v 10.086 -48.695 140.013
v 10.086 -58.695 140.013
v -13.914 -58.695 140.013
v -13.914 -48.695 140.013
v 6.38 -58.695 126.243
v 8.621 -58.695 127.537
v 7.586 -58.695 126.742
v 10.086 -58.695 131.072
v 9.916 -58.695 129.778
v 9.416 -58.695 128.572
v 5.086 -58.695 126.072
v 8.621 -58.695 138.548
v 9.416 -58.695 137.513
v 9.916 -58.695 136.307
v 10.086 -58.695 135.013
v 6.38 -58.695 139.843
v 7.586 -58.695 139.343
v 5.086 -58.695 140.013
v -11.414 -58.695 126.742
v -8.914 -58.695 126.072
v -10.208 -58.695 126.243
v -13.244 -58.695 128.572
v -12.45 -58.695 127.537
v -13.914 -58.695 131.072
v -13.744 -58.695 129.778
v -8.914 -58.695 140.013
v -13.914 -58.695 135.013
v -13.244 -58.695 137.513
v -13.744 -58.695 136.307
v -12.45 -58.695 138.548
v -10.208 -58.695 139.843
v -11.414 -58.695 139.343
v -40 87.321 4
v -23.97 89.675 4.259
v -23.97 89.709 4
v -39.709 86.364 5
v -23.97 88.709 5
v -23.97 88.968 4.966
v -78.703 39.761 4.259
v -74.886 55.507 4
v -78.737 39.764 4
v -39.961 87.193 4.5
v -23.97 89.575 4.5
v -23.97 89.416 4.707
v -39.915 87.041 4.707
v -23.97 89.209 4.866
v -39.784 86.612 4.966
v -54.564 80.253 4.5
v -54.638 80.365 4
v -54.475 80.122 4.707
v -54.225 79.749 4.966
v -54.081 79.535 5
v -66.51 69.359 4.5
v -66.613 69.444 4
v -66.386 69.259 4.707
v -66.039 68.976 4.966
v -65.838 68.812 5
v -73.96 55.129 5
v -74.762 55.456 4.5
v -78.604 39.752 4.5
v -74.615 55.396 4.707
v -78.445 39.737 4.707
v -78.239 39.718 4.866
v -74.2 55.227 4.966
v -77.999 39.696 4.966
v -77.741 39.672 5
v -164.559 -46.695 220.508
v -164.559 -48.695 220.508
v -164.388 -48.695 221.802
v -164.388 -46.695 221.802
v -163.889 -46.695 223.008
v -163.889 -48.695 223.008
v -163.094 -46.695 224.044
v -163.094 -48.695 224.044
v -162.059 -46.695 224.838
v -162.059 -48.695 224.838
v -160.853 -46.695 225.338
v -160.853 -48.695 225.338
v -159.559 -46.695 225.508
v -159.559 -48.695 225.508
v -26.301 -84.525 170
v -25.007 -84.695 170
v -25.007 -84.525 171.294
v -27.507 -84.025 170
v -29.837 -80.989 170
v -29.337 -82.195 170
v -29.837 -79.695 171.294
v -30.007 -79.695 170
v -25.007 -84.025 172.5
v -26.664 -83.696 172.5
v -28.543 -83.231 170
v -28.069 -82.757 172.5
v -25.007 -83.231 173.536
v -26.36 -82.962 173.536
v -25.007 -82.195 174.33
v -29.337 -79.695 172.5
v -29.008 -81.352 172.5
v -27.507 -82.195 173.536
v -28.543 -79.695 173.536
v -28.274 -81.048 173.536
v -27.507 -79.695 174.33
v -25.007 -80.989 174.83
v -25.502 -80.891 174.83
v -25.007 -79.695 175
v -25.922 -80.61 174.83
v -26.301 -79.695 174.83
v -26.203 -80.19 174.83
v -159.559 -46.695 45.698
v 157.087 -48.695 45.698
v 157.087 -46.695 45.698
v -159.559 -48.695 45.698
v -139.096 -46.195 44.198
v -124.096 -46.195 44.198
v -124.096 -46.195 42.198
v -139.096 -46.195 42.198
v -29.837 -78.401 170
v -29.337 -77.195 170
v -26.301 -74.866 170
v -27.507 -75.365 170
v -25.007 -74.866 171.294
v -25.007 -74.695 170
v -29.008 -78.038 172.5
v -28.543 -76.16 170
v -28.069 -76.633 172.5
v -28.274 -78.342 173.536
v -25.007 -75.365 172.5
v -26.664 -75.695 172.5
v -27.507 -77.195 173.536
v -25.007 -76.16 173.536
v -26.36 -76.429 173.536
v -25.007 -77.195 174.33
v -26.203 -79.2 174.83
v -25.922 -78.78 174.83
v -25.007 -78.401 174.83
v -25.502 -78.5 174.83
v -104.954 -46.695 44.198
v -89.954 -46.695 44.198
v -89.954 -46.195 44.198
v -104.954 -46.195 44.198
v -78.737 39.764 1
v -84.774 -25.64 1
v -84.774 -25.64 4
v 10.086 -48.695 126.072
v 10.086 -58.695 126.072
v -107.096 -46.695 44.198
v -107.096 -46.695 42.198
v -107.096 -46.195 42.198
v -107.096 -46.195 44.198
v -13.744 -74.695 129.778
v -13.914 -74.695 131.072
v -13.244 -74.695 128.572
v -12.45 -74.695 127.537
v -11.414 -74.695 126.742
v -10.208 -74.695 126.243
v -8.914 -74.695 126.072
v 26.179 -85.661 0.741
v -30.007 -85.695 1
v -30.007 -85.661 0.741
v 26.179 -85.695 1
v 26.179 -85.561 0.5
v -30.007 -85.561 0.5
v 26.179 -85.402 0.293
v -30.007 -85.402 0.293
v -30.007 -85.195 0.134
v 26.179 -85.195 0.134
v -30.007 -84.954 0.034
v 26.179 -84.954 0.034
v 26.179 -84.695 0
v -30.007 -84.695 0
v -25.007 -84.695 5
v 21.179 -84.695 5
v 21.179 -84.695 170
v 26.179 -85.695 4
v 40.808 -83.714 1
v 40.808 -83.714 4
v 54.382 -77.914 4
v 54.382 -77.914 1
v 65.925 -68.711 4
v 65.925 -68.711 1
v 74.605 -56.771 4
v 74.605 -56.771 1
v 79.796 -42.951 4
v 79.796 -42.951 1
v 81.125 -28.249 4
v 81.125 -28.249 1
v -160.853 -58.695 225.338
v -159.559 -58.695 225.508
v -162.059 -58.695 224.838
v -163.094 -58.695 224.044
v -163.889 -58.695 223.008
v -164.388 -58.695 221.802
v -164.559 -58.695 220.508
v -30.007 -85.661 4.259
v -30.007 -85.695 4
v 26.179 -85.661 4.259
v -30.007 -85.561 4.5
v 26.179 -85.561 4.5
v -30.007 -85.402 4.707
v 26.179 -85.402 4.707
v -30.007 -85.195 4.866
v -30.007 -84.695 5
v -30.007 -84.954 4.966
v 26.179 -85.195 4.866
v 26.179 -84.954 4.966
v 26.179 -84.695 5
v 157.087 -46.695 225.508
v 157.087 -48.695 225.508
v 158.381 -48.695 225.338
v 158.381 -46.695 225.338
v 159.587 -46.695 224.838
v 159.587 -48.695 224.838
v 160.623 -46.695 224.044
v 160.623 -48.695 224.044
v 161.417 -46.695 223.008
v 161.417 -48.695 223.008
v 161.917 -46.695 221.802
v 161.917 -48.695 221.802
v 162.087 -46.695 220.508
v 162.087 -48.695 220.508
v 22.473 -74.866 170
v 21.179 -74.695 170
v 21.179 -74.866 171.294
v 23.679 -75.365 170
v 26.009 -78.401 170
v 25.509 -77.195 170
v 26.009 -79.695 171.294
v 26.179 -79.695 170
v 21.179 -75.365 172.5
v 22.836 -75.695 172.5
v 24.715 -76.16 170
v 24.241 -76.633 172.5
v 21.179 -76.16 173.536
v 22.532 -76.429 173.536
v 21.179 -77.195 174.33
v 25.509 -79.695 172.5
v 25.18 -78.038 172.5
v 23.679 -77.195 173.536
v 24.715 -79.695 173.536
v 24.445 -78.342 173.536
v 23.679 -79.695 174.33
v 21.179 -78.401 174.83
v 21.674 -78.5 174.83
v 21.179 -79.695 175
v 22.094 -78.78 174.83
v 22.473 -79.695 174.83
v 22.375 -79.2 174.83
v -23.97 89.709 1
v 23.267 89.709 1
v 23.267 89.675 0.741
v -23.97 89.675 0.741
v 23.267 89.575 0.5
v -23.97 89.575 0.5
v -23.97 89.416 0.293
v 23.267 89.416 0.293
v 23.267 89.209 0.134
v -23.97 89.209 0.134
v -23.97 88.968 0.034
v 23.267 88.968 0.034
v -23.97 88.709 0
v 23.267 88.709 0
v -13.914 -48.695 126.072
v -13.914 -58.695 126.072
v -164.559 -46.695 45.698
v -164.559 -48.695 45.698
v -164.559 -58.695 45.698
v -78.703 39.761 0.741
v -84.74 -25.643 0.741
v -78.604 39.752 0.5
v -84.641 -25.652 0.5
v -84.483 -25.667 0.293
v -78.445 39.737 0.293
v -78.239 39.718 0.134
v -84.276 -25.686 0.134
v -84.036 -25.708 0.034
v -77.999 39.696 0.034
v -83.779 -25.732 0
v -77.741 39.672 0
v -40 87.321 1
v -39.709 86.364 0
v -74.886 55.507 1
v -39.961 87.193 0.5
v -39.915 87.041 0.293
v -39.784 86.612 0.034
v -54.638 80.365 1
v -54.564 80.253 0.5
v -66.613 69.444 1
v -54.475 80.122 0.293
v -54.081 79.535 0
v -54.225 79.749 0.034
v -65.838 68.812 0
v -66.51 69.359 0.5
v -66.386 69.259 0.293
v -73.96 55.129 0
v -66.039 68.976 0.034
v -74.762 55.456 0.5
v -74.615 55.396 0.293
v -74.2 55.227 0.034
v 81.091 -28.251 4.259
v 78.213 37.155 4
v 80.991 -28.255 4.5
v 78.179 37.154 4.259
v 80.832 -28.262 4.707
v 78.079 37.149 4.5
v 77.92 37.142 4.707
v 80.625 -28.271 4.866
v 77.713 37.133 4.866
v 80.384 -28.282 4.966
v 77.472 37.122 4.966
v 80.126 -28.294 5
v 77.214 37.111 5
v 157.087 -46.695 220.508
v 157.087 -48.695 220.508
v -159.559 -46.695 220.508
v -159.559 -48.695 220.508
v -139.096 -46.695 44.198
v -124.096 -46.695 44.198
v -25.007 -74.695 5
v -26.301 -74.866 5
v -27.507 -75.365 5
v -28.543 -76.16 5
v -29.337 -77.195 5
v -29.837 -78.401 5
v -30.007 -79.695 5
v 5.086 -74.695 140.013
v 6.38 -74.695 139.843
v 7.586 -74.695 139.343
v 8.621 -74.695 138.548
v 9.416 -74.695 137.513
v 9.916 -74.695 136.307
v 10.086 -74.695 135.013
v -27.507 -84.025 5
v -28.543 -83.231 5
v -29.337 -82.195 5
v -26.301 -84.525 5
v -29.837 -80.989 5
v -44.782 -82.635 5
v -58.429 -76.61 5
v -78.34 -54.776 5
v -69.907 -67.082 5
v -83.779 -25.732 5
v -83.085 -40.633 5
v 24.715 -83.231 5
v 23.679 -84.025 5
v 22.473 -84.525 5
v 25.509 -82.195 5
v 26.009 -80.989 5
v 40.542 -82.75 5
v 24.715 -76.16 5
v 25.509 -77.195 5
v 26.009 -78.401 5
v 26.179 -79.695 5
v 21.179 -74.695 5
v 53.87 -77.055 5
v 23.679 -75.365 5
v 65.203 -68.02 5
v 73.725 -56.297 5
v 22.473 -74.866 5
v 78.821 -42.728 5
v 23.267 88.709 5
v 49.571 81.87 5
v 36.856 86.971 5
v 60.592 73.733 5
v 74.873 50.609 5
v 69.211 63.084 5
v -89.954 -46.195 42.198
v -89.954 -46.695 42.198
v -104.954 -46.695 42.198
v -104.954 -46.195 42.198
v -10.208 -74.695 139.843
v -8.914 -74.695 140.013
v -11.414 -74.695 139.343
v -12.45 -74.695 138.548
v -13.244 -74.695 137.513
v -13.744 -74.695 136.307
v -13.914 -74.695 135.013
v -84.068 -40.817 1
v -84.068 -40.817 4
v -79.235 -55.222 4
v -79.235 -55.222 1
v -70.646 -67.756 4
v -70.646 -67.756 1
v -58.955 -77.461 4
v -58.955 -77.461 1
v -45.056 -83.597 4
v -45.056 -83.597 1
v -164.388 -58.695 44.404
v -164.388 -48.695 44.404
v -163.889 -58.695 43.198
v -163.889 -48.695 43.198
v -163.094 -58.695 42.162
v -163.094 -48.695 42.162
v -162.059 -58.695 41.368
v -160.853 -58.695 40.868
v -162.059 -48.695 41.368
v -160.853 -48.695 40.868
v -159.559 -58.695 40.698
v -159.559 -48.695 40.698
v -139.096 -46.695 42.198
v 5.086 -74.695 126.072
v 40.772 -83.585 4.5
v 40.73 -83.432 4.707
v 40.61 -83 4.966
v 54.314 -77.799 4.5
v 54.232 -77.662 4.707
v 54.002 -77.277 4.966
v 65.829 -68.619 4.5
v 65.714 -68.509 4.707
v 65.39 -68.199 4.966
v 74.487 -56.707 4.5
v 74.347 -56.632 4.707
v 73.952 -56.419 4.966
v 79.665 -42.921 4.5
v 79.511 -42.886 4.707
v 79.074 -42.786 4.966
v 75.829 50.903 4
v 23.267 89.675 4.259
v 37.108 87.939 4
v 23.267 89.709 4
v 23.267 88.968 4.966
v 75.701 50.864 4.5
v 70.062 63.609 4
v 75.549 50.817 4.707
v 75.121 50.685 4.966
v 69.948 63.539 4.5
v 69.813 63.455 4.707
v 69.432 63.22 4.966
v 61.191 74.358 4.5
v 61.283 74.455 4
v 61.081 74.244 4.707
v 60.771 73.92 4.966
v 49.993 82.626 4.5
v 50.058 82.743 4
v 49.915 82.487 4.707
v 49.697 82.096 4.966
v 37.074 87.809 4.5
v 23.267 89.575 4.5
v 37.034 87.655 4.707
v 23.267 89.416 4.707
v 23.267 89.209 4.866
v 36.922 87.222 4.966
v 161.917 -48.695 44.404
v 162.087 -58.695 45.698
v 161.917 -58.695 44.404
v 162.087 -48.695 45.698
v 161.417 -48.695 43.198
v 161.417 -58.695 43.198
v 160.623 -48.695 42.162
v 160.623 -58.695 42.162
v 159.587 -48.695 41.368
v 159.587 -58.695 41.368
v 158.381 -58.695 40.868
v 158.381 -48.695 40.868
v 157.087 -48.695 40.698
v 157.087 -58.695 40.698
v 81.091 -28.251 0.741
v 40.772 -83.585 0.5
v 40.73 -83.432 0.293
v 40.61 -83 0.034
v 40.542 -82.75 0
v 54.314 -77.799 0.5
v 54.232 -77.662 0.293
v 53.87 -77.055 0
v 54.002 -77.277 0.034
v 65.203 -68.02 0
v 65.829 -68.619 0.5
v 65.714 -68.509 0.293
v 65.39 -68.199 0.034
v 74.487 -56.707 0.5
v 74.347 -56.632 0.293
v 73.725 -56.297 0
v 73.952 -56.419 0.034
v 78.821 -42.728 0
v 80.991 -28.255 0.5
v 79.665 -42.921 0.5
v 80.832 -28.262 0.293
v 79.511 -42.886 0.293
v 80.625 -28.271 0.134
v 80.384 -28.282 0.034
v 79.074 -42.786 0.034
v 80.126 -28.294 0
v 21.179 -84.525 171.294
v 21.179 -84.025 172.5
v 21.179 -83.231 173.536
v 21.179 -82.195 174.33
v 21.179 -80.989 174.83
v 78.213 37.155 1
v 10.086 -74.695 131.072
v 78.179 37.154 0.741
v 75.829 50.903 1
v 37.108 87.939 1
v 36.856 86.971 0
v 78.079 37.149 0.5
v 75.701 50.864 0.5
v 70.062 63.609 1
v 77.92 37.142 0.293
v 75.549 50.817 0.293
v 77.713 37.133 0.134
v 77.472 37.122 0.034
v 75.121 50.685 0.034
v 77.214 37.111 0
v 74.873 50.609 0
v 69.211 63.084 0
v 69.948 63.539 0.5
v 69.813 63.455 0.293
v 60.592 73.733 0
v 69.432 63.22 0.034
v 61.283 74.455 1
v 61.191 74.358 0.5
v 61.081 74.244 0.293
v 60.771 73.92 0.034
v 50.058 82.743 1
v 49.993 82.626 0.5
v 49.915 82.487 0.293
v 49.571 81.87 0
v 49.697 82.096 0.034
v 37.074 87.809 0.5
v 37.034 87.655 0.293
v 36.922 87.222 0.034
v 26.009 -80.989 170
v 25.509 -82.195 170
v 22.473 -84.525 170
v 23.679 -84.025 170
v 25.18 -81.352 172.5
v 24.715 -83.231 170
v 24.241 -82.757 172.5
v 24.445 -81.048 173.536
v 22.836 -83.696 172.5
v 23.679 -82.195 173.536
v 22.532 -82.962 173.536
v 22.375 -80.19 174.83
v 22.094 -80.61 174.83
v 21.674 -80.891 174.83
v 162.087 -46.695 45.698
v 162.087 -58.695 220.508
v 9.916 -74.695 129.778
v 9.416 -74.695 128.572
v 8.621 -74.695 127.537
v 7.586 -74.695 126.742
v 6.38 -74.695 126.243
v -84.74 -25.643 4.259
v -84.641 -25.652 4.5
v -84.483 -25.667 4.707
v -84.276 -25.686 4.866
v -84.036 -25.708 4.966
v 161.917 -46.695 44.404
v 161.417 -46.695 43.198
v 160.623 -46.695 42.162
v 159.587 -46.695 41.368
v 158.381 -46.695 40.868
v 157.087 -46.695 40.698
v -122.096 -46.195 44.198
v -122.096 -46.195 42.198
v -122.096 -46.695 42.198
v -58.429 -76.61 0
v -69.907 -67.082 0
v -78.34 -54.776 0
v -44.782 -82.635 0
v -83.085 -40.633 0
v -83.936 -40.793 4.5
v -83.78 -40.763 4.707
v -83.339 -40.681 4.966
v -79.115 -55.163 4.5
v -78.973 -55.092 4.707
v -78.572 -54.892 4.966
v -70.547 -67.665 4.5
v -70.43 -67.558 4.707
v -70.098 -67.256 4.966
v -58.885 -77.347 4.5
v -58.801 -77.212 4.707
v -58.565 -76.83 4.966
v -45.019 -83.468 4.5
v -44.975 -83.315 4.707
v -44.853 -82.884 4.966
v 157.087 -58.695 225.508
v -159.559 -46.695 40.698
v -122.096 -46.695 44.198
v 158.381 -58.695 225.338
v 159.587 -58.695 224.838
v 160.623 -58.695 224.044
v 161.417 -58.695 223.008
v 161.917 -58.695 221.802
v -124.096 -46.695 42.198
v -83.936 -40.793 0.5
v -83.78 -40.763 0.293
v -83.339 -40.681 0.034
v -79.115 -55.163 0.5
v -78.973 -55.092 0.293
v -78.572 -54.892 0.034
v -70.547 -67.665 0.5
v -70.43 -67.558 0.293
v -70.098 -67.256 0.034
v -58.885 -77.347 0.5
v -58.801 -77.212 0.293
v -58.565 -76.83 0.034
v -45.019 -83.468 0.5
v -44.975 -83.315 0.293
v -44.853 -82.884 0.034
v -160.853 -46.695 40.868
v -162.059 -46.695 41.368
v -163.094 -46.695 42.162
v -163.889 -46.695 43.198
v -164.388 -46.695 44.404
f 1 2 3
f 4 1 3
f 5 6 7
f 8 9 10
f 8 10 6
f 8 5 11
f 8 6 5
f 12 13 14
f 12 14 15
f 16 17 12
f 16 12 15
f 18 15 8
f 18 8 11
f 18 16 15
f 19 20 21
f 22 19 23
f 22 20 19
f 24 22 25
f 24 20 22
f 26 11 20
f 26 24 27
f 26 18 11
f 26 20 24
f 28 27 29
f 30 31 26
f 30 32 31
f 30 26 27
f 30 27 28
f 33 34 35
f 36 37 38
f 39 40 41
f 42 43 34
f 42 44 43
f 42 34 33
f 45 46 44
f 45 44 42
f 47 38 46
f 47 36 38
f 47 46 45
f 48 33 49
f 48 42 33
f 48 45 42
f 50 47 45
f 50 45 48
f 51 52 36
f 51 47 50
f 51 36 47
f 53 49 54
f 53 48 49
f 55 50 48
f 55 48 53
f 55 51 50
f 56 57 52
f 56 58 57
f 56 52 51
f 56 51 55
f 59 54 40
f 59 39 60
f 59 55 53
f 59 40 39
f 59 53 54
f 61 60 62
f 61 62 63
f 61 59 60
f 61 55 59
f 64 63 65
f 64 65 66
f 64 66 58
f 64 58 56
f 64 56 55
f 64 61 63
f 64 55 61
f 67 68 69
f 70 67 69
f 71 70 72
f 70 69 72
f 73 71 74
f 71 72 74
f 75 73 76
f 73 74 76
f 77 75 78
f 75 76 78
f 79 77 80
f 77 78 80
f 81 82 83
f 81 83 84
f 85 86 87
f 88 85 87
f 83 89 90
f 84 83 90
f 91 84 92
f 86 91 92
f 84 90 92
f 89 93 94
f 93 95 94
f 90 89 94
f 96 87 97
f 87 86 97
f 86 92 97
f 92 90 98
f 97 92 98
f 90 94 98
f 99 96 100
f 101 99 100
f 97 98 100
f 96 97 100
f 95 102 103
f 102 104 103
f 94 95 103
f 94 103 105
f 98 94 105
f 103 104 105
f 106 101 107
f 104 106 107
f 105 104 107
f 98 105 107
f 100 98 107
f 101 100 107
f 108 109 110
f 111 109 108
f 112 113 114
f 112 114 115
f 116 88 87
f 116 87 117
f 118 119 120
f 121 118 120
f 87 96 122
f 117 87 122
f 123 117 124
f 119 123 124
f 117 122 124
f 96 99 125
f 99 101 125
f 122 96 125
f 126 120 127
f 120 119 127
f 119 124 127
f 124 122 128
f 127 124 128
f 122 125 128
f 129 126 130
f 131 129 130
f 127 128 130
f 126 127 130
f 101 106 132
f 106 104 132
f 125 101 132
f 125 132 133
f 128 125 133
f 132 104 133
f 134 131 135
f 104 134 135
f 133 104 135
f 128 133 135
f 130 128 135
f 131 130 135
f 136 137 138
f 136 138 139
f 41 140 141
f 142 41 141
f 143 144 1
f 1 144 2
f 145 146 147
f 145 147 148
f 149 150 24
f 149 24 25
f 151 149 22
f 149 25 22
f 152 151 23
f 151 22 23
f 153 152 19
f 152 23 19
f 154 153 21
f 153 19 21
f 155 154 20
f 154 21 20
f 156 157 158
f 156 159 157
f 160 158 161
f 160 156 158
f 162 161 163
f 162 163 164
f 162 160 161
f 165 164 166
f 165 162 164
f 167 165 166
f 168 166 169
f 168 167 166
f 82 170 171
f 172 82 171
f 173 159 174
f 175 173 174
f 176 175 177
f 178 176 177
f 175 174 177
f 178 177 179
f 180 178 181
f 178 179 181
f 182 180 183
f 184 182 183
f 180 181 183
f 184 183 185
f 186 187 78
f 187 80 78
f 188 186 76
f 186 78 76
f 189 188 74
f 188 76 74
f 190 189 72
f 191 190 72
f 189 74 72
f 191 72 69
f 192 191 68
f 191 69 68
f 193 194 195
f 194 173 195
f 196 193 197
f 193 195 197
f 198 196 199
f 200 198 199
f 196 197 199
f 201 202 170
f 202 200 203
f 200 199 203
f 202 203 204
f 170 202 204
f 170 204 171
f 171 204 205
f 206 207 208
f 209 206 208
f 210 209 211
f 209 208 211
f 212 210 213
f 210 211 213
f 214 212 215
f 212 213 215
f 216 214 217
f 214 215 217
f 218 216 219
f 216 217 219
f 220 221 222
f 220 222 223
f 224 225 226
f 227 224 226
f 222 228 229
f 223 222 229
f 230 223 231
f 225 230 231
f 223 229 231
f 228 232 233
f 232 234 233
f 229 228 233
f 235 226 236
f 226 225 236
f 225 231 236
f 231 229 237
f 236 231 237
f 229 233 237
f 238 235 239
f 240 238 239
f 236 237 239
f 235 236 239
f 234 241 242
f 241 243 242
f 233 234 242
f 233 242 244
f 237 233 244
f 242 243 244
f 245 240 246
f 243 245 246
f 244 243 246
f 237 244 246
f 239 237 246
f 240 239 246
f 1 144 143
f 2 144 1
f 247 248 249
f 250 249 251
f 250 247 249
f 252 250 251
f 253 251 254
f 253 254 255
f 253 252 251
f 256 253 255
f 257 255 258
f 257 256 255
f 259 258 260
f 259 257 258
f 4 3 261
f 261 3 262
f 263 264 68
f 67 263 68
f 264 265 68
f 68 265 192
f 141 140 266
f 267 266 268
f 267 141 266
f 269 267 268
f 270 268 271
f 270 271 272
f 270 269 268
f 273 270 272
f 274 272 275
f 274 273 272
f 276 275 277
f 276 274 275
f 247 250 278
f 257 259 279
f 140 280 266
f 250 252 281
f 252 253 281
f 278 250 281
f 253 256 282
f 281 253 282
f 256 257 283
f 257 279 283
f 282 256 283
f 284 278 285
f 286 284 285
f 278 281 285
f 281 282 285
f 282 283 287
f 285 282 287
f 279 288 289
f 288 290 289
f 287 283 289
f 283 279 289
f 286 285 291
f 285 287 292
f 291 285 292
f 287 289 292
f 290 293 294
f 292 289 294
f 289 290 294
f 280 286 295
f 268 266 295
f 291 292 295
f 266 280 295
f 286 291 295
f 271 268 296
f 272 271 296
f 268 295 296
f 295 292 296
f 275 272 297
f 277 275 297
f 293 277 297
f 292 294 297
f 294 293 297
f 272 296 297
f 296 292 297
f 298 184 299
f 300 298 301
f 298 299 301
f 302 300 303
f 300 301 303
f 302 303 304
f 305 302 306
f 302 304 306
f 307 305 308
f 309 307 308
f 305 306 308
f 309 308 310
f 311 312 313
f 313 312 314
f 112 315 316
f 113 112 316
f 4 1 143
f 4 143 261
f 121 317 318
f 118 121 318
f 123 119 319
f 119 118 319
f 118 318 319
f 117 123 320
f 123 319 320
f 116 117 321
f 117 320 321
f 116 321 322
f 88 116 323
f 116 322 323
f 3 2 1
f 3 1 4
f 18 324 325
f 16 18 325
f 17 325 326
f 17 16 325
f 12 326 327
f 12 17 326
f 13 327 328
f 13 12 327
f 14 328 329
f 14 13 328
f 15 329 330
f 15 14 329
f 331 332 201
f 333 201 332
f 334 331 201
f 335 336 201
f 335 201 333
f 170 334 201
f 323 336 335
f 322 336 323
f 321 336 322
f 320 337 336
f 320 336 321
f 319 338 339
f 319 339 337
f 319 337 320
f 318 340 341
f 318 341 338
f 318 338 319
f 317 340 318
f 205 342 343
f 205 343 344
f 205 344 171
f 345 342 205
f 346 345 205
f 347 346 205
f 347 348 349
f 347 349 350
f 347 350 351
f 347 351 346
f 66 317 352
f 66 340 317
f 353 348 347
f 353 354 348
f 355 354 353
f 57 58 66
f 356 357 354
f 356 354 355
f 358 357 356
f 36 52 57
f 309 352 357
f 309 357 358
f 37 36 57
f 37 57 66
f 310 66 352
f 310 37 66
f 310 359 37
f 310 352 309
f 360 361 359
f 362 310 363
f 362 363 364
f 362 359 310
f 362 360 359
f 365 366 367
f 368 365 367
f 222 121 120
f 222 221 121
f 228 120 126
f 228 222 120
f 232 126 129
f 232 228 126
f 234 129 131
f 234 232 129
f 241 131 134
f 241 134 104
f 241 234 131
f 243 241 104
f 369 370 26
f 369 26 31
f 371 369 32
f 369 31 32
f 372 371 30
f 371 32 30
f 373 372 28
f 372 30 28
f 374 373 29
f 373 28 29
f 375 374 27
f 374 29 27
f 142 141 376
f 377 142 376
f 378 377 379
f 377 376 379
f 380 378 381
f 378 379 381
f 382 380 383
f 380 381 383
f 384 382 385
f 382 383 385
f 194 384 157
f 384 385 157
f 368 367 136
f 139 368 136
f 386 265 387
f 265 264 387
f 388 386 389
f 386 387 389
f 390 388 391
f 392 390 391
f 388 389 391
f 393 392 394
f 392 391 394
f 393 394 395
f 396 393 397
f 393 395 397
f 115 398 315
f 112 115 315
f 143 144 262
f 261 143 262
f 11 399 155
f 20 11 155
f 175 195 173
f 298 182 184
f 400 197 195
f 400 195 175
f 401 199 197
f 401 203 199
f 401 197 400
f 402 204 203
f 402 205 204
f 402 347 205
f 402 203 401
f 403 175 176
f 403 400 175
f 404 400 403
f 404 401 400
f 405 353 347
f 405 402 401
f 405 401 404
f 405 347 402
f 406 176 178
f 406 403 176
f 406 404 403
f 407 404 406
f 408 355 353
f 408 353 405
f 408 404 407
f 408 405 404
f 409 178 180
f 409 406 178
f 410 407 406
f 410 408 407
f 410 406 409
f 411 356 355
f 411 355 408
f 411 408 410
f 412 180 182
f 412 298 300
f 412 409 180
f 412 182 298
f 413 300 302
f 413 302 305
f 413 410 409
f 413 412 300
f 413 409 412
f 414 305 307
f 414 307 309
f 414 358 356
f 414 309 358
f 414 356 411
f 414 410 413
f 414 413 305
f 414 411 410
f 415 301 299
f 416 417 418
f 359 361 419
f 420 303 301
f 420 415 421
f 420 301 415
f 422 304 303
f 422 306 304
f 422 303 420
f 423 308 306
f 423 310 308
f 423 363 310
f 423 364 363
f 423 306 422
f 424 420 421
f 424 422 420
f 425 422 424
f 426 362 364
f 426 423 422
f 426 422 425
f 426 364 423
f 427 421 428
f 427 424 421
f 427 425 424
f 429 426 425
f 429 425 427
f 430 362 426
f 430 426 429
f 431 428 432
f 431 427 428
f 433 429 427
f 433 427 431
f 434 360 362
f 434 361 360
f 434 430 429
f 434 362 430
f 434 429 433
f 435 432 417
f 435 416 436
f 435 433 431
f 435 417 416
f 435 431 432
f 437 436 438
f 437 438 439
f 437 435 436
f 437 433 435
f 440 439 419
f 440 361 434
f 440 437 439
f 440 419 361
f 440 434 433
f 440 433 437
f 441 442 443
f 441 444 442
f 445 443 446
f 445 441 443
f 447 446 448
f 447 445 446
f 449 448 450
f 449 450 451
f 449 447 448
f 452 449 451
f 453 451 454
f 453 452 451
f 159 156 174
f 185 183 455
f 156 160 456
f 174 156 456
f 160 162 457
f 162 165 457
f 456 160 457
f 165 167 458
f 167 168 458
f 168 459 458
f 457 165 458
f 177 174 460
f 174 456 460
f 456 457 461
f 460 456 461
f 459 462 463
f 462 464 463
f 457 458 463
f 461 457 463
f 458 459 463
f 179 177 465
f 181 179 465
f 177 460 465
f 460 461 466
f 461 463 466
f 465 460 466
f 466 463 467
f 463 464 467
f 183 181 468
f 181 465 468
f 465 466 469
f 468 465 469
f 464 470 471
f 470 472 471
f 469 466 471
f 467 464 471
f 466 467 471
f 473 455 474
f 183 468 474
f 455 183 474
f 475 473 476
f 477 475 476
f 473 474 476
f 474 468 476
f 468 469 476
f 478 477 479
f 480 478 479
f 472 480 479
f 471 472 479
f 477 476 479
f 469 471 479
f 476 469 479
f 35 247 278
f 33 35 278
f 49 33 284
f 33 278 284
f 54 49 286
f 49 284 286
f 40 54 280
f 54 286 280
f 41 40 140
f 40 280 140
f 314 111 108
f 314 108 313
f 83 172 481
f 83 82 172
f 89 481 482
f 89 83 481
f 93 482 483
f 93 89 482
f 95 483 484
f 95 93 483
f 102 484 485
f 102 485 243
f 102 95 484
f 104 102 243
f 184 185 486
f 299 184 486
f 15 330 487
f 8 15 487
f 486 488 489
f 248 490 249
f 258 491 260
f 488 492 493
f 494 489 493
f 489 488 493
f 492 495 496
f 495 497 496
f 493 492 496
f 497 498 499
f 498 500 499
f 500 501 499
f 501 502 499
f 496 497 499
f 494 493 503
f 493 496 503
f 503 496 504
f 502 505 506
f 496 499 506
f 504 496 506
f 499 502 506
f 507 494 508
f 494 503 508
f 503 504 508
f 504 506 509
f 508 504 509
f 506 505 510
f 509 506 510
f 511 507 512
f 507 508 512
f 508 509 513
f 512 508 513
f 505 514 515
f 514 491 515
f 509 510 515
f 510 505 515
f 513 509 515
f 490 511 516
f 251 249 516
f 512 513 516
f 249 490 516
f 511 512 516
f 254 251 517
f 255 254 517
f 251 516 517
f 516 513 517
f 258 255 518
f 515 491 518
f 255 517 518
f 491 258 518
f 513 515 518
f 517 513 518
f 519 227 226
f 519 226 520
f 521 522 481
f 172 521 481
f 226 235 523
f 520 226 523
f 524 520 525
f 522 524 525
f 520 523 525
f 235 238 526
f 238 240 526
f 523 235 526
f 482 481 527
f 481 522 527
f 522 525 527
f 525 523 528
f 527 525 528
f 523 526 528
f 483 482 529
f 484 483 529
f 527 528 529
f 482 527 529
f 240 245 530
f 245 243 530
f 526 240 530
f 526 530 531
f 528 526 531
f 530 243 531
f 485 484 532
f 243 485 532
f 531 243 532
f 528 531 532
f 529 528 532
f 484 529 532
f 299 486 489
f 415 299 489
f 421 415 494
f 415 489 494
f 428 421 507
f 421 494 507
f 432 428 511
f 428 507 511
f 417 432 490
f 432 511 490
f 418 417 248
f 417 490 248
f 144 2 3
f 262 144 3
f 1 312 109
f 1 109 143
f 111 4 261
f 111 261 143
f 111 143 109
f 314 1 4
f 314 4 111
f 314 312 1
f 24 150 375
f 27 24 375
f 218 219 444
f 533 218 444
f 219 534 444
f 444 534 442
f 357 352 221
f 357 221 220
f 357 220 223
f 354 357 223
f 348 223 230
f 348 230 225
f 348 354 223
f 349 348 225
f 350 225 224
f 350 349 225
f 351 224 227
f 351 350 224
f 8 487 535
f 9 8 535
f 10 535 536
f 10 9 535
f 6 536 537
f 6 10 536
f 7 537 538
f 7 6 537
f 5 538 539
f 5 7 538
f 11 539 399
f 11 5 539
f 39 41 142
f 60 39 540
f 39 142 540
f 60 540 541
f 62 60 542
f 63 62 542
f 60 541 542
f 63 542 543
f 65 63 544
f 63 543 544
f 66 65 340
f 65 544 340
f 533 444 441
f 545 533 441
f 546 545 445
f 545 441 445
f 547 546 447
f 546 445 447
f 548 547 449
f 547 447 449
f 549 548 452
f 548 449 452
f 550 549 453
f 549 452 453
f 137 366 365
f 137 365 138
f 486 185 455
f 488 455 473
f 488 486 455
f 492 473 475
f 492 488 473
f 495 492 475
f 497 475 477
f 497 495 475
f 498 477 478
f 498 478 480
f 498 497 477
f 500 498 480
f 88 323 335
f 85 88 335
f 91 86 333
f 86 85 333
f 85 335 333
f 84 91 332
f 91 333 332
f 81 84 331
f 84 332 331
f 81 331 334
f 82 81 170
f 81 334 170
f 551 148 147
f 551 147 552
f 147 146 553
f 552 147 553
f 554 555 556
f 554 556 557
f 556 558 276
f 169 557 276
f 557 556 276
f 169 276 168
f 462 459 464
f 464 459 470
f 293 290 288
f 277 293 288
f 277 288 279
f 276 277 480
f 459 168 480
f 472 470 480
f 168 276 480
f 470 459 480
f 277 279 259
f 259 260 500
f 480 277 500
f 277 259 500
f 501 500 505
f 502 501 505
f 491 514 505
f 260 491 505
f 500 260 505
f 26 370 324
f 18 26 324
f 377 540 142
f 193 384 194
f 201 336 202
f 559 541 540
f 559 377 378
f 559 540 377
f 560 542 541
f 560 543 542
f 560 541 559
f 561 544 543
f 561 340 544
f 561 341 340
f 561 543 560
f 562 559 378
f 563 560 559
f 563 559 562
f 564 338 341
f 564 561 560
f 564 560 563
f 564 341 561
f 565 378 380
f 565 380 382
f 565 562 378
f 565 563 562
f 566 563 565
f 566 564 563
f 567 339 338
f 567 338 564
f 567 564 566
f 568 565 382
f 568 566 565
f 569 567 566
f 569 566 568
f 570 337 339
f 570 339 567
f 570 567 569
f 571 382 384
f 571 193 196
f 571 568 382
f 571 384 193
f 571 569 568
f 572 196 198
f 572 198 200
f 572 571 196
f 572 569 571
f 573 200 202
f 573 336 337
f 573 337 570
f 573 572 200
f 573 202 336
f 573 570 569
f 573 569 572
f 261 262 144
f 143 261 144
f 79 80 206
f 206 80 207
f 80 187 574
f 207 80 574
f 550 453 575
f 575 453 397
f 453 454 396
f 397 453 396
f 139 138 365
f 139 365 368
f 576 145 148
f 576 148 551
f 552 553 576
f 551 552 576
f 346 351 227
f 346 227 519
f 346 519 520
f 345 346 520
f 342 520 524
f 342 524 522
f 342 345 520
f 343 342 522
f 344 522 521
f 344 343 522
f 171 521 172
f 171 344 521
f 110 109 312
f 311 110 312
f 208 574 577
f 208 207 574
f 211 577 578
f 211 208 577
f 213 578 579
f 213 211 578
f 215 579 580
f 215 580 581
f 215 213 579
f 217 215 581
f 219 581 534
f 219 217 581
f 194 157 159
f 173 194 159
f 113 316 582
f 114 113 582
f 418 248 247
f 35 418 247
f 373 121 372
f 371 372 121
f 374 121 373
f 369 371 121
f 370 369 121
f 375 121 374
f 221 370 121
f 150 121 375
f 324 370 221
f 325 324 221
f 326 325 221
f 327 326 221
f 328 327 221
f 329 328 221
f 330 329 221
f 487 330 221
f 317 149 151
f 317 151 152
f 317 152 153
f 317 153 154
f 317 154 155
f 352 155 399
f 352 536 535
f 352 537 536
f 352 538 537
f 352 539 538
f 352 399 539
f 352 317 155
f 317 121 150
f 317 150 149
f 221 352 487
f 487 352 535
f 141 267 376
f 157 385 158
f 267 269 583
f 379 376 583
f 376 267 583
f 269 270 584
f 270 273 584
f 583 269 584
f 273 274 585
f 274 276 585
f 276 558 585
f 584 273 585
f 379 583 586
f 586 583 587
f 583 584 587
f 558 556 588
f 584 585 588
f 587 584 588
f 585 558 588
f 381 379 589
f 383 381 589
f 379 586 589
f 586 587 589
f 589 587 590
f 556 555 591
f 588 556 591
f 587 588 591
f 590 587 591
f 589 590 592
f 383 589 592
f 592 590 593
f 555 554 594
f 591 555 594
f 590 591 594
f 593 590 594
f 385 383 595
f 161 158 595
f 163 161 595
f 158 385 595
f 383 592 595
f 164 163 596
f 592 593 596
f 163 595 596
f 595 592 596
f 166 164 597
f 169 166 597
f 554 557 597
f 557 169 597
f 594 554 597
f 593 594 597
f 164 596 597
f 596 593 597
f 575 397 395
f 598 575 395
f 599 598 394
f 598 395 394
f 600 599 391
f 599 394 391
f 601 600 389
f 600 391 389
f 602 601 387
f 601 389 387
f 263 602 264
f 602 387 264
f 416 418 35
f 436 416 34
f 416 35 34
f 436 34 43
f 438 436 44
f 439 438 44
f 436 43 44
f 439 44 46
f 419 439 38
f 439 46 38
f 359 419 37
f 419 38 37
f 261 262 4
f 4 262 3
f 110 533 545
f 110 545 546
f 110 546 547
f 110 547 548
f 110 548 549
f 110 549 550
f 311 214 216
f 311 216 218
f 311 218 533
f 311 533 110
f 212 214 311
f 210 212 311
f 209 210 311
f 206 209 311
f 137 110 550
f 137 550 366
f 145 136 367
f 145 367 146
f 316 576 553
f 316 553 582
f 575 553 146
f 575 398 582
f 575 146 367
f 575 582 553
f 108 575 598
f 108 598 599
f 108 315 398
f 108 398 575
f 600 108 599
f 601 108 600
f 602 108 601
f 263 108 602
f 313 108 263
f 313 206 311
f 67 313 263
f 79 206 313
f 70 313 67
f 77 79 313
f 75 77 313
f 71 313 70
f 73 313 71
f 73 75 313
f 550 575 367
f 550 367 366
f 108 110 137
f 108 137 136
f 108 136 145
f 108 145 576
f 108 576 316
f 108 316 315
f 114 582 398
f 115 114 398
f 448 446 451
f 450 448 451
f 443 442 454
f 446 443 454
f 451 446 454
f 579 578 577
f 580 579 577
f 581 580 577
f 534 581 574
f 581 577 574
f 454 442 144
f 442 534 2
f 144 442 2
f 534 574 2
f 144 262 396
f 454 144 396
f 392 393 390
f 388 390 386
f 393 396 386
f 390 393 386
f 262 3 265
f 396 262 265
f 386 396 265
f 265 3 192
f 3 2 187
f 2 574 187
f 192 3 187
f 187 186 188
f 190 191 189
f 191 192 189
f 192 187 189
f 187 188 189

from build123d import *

# Parameters (mm, degrees)
F1_DEPTH    = 5
F2_R        = 1
F3_W        = 56.1862232486
F3_H        = 10
F4_DEPTH    = 170
F5_T1_DEPTH = 170
F6_T1_DEPTH = 170
F8_DEPTH    = 16
F9_R        = 4.99999
F11_DEPTH   = 10
F12_W       = 24
F12_H       = 13.9404982328
F13_DEPTH   = 10
F14_R       = 5
F15_R       = 5
F16_W       = 316.6455233097
F16_H       = 174.8104447126
F17_DEPTH   = 2
F18_W       = 15
F18_H       = 2
F19_DEPTH   = 0.5
F20_R       = 5
F21_R       = 5


# Not quite as in the source:
# - a fillet or chamfer that OpenCascade refuses, or shapes differently, is made with other operations: its cross-section is extruded or revolved along the edge and cut away or added
# - a fillet or chamfer is up to 0.001 mm smaller than in the source, because OpenCascade refuses the exact size


with BuildPart() as f1:
    # F0 (on Top) → F1 (new body)
    with BuildSketch(Plane.XY):
        with BuildLine():
            Line((23.2672947912, 89.7089094173), (-23.969883312, 89.7089094173))
            ThreePointArc((-23.969883312, 89.7089094173), (-61.030315745, 75.3478605341), (-78.737050658, 39.7643402492))
            Line((-78.737050658, 39.7643402492), (-84.7743571616, -25.63981354))
            ThreePointArc((-84.7743571616, -25.63981354), (-70.6461409325, -67.7556768049), (-30.0071898156, -85.6952443719))
            Line((-30.0071898156, -85.6952443719), (26.1790334329, -85.6952443719))
            ThreePointArc((26.1790334329, -85.6952443719), (65.9253366057, -68.7114433416), (81.1246105138, -28.2491128847))
            Line((81.1246105138, -28.2491128847), (78.2128718721, 37.1550409045))
            ThreePointArc((78.2128718721, 37.1550409045), (61.2834937609, 74.45521259), (23.2672947912, 89.7089094173))
        make_face()
    extrude(amount=F1_DEPTH)

    # F2
    f2_edges = [f1.edges().sort_by_distance(p)[0] for p in [
        (79.668741, 4.452964, 0),
        (61.283494, 74.455213, 0),
        (-0.351294, 89.708909, 0),
        (-61.030316, 75.347861, 0),
        (-81.755704, 7.062263, 0),
        (-70.646141, -67.755677, 0),
        (-1.914078, -85.695244, 0),
        (65.925337, -68.711443, 0),
        (79.668741, 4.452964, 5),
        (61.283494, 74.455213, 5),
        (-0.351294, 89.708909, 5),
        (-61.030316, 75.347861, 5),
        (-81.755704, 7.062263, 5),
        (-70.646141, -67.755677, 5),
        (-1.914078, -85.695244, 5),
        (65.925337, -68.711443, 5),
    ]]
    fillet(f2_edges, radius=F2_R)

    # F3 (on face) → F4 (join)
    with BuildSketch(Plane.XY.offset(5)):
        with Locations((-1.9140781913, -79.6952443719)):
            Rectangle(F3_W, F3_H)
    extrude(amount=F4_DEPTH)

    # F5: fillet of radius 5 on 1 edges, made by hand

    # F5_s2 → F5_t1 (cut)
    with BuildSketch(Plane.XY.offset(5)):
        with BuildLine():
            ThreePointArc((26.1790334329, -79.6952443719), (24.7145673389, -83.2307782778), (21.1790334329, -84.6952443719))
            Line((21.1790334329, -84.6952443719), (21.1790334329, -84.7952443719))
            Line((21.1790334329, -84.7952443719), (26.2790334329, -84.7952443719))
            Line((26.2790334329, -84.7952443719), (26.2790334329, -79.6952443719))
            Line((26.2790334329, -79.6952443719), (26.1790334329, -79.6952443719))
        make_face()
    extrude(amount=F5_T1_DEPTH, mode=Mode.SUBTRACT)

    # F6: fillet of radius 5 on 3 edges, made by hand

    # F6_s2 → F6_t1 (cut)
    with BuildSketch(Plane.XY.offset(5)):
        with BuildLine():
            ThreePointArc((21.1790334329, -74.6952443719), (24.7145673389, -76.159710466), (26.1790334329, -79.6952443719))
            Line((26.1790334329, -79.6952443719), (26.2790334329, -79.6952443719))
            Line((26.2790334329, -79.6952443719), (26.2790334329, -74.5952443719))
            Line((26.2790334329, -74.5952443719), (21.1790334329, -74.5952443719))
            Line((21.1790334329, -74.5952443719), (21.1790334329, -74.6952443719))
        make_face()
        with BuildLine():
            ThreePointArc((-25.0071898156, -74.6952443719), (-28.5427237216, -76.159710466), (-30.0071898156, -79.6952443719))
            Line((-30.0071898156, -79.6952443719), (-30.1071898156, -79.6952443719))
            Line((-30.1071898156, -79.6952443719), (-30.1071898156, -74.5952443719))
            Line((-30.1071898156, -74.5952443719), (-25.0071898156, -74.5952443719))
            Line((-25.0071898156, -74.5952443719), (-25.0071898156, -74.6952443719))
        make_face()
        with BuildLine():
            ThreePointArc((-30.0071898156, -79.6952443719), (-28.5427237216, -83.2307782778), (-25.0071898156, -84.6952443719))
            Line((-25.0071898156, -84.6952443719), (-25.0071898156, -84.7952443719))
            Line((-25.0071898156, -84.7952443719), (-30.1071898156, -84.7952443719))
            Line((-30.1071898156, -84.7952443719), (-30.1071898156, -79.6952443719))
            Line((-30.1071898156, -79.6952443719), (-30.0071898156, -79.6952443719))
        make_face()
    extrude(amount=F6_T1_DEPTH, mode=Mode.SUBTRACT)

    # F7 (on face) → F8 (join)
    with BuildSketch(Plane(origin=(0, -74.6952443719, 0), x_dir=(-1, 0, 0), z_dir=(0, 1, 0))):
        Polygon((13.9140781913, 140.0128751993), (1.9140781913, 140.0128751993), (-10.0859218087, 140.0128751993), (-10.0859218087, 126.0723769665), (13.9140781913, 126.0723769665), align=None)
    extrude(amount=F8_DEPTH)

    # F9 (radius 5 in the source; OpenCascade refuses exactly that, so slightly less here)
    f9_edges = [f1.edges().sort_by_distance(p)[0] for p in [
        (-1.914078, -74.695244, 175),
        (-28.542724, -76.15971, 175),
        (24.714567, -76.15971, 175),
        (24.714567, -83.230778, 175),
        (-1.914078, -84.695244, 175),
        (-28.542724, -83.230778, 175),
    ]]
    fillet(f9_edges, radius=F9_R)

    # F20
    f20_edges = [f1.edges().sort_by_distance(p)[0] for p in [
        (-13.914078, -66.695244, 140.012875),
    ]]
    fillet(f20_edges, radius=F20_R)

    # F21
    f21_edges = [f1.edges().sort_by_distance(p)[0] for p in [
        (-13.914078, -66.695244, 126.072377),
        (10.085922, -66.695244, 140.012875),
        (10.085922, -66.695244, 126.072377),
    ]]
    fillet(f21_edges, radius=F21_R)


with BuildPart() as f11:
    # F10 (on face) → F11 (new body)
    with BuildSketch(Plane(origin=(0, -58.6952443719, 0), x_dir=(-1, 0, 0), z_dir=(0, 1, 0))):
        Polygon((164.5585149527, 225.5081981421), (1.9140781913, 225.5081981421), (-162.087008357, 225.5081981421), (-162.087008357, 40.6977534294), (-160.0567102432, 40.6977534294), (164.5585149527, 40.6977534294), align=None)
        Polygon((-10.0859218087, 140.0128751993), (1.9140781913, 140.0128751993), (13.9140781913, 140.0128751993), (13.9140781913, 126.0723769665), (-10.0859218087, 126.0723769665), align=None, mode=Mode.SUBTRACT)
    extrude(amount=F11_DEPTH)

    # F14
    f14_edges = [f11.edges().sort_by_distance(p)[0] for p in [
        (162.087008, -53.695244, 225.508198),
    ]]
    fillet(f14_edges, radius=F14_R)

    # F15
    f15_edges = [f11.edges().sort_by_distance(p)[0] for p in [
        (-164.558515, -53.695244, 225.508198),
        (-164.558515, -53.695244, 40.697753),
        (162.087008, -53.695244, 40.697753),
    ]]
    fillet(f15_edges, radius=F15_R)

    # F16 (on face) → F17 (join)
    with BuildSketch(Plane(origin=(0, -48.6952443719, 0), x_dir=(-1, 0, 0), z_dir=(0, 1, 0))):
        with BuildLine():
            ThreePointArc((164.5585149527, 220.5081981421), (163.0940488586, 224.043732048), (159.5585149527, 225.5081981421))
            Line((159.5585149527, 225.5081981421), (-157.087008357, 225.5081981421))
            ThreePointArc((-157.087008357, 225.5081981421), (-160.622542263, 224.043732048), (-162.087008357, 220.5081981421))
            Line((-162.087008357, 220.5081981421), (-162.087008357, 45.6977534294))
            ThreePointArc((-162.087008357, 45.6977534294), (-160.622542263, 42.1622195235), (-157.087008357, 40.6977534294))
            Line((-157.087008357, 40.6977534294), (159.5585149527, 40.6977534294))
            ThreePointArc((159.5585149527, 40.6977534294), (163.0940488586, 42.1622195235), (164.5585149527, 45.6977534294))
            Line((164.5585149527, 45.6977534294), (164.5585149527, 220.5081981421))
        make_face()
        with Locations((1.2357532978, 133.1029757857)):
            Rectangle(F16_W, F16_H, mode=Mode.SUBTRACT)
    extrude(amount=F17_DEPTH)

    # F18 (on face) → F19 (join)
    with BuildSketch(Plane(origin=(0, -46.6952443719, 0), x_dir=(-1, 0, 0), z_dir=(0, 1, 0))):
        with Locations((97.4538546801, 43.1977534294)):
            Rectangle(F18_W, F18_H)
        with Locations((114.5963103771, 43.1977534294)):
            Rectangle(F18_W, F18_H)
        Polygon((139.0963103771, 42.1977534294), (139.0963103771, 44.1977534294), (129.0963103771, 44.1977534294), (124.0963103771, 44.1977534294), (124.0963103771, 42.1977534294), (130.4579966664, 42.1977534294), align=None)
    extrude(amount=F19_DEPTH)


with BuildPart() as f13:
    # F12 (on face) → F13 (new body)
    with BuildSketch(Plane(origin=(0, -58.6952443719, 0), x_dir=(-1, 0, 0), z_dir=(0, 1, 0))):
        with Locations((1.9140781913, 133.0426260829)):
            Rectangle(F12_W, F12_H)
    extrude(amount=F13_DEPTH)


solid = Compound([f1.part, f11.part, f13.part])
